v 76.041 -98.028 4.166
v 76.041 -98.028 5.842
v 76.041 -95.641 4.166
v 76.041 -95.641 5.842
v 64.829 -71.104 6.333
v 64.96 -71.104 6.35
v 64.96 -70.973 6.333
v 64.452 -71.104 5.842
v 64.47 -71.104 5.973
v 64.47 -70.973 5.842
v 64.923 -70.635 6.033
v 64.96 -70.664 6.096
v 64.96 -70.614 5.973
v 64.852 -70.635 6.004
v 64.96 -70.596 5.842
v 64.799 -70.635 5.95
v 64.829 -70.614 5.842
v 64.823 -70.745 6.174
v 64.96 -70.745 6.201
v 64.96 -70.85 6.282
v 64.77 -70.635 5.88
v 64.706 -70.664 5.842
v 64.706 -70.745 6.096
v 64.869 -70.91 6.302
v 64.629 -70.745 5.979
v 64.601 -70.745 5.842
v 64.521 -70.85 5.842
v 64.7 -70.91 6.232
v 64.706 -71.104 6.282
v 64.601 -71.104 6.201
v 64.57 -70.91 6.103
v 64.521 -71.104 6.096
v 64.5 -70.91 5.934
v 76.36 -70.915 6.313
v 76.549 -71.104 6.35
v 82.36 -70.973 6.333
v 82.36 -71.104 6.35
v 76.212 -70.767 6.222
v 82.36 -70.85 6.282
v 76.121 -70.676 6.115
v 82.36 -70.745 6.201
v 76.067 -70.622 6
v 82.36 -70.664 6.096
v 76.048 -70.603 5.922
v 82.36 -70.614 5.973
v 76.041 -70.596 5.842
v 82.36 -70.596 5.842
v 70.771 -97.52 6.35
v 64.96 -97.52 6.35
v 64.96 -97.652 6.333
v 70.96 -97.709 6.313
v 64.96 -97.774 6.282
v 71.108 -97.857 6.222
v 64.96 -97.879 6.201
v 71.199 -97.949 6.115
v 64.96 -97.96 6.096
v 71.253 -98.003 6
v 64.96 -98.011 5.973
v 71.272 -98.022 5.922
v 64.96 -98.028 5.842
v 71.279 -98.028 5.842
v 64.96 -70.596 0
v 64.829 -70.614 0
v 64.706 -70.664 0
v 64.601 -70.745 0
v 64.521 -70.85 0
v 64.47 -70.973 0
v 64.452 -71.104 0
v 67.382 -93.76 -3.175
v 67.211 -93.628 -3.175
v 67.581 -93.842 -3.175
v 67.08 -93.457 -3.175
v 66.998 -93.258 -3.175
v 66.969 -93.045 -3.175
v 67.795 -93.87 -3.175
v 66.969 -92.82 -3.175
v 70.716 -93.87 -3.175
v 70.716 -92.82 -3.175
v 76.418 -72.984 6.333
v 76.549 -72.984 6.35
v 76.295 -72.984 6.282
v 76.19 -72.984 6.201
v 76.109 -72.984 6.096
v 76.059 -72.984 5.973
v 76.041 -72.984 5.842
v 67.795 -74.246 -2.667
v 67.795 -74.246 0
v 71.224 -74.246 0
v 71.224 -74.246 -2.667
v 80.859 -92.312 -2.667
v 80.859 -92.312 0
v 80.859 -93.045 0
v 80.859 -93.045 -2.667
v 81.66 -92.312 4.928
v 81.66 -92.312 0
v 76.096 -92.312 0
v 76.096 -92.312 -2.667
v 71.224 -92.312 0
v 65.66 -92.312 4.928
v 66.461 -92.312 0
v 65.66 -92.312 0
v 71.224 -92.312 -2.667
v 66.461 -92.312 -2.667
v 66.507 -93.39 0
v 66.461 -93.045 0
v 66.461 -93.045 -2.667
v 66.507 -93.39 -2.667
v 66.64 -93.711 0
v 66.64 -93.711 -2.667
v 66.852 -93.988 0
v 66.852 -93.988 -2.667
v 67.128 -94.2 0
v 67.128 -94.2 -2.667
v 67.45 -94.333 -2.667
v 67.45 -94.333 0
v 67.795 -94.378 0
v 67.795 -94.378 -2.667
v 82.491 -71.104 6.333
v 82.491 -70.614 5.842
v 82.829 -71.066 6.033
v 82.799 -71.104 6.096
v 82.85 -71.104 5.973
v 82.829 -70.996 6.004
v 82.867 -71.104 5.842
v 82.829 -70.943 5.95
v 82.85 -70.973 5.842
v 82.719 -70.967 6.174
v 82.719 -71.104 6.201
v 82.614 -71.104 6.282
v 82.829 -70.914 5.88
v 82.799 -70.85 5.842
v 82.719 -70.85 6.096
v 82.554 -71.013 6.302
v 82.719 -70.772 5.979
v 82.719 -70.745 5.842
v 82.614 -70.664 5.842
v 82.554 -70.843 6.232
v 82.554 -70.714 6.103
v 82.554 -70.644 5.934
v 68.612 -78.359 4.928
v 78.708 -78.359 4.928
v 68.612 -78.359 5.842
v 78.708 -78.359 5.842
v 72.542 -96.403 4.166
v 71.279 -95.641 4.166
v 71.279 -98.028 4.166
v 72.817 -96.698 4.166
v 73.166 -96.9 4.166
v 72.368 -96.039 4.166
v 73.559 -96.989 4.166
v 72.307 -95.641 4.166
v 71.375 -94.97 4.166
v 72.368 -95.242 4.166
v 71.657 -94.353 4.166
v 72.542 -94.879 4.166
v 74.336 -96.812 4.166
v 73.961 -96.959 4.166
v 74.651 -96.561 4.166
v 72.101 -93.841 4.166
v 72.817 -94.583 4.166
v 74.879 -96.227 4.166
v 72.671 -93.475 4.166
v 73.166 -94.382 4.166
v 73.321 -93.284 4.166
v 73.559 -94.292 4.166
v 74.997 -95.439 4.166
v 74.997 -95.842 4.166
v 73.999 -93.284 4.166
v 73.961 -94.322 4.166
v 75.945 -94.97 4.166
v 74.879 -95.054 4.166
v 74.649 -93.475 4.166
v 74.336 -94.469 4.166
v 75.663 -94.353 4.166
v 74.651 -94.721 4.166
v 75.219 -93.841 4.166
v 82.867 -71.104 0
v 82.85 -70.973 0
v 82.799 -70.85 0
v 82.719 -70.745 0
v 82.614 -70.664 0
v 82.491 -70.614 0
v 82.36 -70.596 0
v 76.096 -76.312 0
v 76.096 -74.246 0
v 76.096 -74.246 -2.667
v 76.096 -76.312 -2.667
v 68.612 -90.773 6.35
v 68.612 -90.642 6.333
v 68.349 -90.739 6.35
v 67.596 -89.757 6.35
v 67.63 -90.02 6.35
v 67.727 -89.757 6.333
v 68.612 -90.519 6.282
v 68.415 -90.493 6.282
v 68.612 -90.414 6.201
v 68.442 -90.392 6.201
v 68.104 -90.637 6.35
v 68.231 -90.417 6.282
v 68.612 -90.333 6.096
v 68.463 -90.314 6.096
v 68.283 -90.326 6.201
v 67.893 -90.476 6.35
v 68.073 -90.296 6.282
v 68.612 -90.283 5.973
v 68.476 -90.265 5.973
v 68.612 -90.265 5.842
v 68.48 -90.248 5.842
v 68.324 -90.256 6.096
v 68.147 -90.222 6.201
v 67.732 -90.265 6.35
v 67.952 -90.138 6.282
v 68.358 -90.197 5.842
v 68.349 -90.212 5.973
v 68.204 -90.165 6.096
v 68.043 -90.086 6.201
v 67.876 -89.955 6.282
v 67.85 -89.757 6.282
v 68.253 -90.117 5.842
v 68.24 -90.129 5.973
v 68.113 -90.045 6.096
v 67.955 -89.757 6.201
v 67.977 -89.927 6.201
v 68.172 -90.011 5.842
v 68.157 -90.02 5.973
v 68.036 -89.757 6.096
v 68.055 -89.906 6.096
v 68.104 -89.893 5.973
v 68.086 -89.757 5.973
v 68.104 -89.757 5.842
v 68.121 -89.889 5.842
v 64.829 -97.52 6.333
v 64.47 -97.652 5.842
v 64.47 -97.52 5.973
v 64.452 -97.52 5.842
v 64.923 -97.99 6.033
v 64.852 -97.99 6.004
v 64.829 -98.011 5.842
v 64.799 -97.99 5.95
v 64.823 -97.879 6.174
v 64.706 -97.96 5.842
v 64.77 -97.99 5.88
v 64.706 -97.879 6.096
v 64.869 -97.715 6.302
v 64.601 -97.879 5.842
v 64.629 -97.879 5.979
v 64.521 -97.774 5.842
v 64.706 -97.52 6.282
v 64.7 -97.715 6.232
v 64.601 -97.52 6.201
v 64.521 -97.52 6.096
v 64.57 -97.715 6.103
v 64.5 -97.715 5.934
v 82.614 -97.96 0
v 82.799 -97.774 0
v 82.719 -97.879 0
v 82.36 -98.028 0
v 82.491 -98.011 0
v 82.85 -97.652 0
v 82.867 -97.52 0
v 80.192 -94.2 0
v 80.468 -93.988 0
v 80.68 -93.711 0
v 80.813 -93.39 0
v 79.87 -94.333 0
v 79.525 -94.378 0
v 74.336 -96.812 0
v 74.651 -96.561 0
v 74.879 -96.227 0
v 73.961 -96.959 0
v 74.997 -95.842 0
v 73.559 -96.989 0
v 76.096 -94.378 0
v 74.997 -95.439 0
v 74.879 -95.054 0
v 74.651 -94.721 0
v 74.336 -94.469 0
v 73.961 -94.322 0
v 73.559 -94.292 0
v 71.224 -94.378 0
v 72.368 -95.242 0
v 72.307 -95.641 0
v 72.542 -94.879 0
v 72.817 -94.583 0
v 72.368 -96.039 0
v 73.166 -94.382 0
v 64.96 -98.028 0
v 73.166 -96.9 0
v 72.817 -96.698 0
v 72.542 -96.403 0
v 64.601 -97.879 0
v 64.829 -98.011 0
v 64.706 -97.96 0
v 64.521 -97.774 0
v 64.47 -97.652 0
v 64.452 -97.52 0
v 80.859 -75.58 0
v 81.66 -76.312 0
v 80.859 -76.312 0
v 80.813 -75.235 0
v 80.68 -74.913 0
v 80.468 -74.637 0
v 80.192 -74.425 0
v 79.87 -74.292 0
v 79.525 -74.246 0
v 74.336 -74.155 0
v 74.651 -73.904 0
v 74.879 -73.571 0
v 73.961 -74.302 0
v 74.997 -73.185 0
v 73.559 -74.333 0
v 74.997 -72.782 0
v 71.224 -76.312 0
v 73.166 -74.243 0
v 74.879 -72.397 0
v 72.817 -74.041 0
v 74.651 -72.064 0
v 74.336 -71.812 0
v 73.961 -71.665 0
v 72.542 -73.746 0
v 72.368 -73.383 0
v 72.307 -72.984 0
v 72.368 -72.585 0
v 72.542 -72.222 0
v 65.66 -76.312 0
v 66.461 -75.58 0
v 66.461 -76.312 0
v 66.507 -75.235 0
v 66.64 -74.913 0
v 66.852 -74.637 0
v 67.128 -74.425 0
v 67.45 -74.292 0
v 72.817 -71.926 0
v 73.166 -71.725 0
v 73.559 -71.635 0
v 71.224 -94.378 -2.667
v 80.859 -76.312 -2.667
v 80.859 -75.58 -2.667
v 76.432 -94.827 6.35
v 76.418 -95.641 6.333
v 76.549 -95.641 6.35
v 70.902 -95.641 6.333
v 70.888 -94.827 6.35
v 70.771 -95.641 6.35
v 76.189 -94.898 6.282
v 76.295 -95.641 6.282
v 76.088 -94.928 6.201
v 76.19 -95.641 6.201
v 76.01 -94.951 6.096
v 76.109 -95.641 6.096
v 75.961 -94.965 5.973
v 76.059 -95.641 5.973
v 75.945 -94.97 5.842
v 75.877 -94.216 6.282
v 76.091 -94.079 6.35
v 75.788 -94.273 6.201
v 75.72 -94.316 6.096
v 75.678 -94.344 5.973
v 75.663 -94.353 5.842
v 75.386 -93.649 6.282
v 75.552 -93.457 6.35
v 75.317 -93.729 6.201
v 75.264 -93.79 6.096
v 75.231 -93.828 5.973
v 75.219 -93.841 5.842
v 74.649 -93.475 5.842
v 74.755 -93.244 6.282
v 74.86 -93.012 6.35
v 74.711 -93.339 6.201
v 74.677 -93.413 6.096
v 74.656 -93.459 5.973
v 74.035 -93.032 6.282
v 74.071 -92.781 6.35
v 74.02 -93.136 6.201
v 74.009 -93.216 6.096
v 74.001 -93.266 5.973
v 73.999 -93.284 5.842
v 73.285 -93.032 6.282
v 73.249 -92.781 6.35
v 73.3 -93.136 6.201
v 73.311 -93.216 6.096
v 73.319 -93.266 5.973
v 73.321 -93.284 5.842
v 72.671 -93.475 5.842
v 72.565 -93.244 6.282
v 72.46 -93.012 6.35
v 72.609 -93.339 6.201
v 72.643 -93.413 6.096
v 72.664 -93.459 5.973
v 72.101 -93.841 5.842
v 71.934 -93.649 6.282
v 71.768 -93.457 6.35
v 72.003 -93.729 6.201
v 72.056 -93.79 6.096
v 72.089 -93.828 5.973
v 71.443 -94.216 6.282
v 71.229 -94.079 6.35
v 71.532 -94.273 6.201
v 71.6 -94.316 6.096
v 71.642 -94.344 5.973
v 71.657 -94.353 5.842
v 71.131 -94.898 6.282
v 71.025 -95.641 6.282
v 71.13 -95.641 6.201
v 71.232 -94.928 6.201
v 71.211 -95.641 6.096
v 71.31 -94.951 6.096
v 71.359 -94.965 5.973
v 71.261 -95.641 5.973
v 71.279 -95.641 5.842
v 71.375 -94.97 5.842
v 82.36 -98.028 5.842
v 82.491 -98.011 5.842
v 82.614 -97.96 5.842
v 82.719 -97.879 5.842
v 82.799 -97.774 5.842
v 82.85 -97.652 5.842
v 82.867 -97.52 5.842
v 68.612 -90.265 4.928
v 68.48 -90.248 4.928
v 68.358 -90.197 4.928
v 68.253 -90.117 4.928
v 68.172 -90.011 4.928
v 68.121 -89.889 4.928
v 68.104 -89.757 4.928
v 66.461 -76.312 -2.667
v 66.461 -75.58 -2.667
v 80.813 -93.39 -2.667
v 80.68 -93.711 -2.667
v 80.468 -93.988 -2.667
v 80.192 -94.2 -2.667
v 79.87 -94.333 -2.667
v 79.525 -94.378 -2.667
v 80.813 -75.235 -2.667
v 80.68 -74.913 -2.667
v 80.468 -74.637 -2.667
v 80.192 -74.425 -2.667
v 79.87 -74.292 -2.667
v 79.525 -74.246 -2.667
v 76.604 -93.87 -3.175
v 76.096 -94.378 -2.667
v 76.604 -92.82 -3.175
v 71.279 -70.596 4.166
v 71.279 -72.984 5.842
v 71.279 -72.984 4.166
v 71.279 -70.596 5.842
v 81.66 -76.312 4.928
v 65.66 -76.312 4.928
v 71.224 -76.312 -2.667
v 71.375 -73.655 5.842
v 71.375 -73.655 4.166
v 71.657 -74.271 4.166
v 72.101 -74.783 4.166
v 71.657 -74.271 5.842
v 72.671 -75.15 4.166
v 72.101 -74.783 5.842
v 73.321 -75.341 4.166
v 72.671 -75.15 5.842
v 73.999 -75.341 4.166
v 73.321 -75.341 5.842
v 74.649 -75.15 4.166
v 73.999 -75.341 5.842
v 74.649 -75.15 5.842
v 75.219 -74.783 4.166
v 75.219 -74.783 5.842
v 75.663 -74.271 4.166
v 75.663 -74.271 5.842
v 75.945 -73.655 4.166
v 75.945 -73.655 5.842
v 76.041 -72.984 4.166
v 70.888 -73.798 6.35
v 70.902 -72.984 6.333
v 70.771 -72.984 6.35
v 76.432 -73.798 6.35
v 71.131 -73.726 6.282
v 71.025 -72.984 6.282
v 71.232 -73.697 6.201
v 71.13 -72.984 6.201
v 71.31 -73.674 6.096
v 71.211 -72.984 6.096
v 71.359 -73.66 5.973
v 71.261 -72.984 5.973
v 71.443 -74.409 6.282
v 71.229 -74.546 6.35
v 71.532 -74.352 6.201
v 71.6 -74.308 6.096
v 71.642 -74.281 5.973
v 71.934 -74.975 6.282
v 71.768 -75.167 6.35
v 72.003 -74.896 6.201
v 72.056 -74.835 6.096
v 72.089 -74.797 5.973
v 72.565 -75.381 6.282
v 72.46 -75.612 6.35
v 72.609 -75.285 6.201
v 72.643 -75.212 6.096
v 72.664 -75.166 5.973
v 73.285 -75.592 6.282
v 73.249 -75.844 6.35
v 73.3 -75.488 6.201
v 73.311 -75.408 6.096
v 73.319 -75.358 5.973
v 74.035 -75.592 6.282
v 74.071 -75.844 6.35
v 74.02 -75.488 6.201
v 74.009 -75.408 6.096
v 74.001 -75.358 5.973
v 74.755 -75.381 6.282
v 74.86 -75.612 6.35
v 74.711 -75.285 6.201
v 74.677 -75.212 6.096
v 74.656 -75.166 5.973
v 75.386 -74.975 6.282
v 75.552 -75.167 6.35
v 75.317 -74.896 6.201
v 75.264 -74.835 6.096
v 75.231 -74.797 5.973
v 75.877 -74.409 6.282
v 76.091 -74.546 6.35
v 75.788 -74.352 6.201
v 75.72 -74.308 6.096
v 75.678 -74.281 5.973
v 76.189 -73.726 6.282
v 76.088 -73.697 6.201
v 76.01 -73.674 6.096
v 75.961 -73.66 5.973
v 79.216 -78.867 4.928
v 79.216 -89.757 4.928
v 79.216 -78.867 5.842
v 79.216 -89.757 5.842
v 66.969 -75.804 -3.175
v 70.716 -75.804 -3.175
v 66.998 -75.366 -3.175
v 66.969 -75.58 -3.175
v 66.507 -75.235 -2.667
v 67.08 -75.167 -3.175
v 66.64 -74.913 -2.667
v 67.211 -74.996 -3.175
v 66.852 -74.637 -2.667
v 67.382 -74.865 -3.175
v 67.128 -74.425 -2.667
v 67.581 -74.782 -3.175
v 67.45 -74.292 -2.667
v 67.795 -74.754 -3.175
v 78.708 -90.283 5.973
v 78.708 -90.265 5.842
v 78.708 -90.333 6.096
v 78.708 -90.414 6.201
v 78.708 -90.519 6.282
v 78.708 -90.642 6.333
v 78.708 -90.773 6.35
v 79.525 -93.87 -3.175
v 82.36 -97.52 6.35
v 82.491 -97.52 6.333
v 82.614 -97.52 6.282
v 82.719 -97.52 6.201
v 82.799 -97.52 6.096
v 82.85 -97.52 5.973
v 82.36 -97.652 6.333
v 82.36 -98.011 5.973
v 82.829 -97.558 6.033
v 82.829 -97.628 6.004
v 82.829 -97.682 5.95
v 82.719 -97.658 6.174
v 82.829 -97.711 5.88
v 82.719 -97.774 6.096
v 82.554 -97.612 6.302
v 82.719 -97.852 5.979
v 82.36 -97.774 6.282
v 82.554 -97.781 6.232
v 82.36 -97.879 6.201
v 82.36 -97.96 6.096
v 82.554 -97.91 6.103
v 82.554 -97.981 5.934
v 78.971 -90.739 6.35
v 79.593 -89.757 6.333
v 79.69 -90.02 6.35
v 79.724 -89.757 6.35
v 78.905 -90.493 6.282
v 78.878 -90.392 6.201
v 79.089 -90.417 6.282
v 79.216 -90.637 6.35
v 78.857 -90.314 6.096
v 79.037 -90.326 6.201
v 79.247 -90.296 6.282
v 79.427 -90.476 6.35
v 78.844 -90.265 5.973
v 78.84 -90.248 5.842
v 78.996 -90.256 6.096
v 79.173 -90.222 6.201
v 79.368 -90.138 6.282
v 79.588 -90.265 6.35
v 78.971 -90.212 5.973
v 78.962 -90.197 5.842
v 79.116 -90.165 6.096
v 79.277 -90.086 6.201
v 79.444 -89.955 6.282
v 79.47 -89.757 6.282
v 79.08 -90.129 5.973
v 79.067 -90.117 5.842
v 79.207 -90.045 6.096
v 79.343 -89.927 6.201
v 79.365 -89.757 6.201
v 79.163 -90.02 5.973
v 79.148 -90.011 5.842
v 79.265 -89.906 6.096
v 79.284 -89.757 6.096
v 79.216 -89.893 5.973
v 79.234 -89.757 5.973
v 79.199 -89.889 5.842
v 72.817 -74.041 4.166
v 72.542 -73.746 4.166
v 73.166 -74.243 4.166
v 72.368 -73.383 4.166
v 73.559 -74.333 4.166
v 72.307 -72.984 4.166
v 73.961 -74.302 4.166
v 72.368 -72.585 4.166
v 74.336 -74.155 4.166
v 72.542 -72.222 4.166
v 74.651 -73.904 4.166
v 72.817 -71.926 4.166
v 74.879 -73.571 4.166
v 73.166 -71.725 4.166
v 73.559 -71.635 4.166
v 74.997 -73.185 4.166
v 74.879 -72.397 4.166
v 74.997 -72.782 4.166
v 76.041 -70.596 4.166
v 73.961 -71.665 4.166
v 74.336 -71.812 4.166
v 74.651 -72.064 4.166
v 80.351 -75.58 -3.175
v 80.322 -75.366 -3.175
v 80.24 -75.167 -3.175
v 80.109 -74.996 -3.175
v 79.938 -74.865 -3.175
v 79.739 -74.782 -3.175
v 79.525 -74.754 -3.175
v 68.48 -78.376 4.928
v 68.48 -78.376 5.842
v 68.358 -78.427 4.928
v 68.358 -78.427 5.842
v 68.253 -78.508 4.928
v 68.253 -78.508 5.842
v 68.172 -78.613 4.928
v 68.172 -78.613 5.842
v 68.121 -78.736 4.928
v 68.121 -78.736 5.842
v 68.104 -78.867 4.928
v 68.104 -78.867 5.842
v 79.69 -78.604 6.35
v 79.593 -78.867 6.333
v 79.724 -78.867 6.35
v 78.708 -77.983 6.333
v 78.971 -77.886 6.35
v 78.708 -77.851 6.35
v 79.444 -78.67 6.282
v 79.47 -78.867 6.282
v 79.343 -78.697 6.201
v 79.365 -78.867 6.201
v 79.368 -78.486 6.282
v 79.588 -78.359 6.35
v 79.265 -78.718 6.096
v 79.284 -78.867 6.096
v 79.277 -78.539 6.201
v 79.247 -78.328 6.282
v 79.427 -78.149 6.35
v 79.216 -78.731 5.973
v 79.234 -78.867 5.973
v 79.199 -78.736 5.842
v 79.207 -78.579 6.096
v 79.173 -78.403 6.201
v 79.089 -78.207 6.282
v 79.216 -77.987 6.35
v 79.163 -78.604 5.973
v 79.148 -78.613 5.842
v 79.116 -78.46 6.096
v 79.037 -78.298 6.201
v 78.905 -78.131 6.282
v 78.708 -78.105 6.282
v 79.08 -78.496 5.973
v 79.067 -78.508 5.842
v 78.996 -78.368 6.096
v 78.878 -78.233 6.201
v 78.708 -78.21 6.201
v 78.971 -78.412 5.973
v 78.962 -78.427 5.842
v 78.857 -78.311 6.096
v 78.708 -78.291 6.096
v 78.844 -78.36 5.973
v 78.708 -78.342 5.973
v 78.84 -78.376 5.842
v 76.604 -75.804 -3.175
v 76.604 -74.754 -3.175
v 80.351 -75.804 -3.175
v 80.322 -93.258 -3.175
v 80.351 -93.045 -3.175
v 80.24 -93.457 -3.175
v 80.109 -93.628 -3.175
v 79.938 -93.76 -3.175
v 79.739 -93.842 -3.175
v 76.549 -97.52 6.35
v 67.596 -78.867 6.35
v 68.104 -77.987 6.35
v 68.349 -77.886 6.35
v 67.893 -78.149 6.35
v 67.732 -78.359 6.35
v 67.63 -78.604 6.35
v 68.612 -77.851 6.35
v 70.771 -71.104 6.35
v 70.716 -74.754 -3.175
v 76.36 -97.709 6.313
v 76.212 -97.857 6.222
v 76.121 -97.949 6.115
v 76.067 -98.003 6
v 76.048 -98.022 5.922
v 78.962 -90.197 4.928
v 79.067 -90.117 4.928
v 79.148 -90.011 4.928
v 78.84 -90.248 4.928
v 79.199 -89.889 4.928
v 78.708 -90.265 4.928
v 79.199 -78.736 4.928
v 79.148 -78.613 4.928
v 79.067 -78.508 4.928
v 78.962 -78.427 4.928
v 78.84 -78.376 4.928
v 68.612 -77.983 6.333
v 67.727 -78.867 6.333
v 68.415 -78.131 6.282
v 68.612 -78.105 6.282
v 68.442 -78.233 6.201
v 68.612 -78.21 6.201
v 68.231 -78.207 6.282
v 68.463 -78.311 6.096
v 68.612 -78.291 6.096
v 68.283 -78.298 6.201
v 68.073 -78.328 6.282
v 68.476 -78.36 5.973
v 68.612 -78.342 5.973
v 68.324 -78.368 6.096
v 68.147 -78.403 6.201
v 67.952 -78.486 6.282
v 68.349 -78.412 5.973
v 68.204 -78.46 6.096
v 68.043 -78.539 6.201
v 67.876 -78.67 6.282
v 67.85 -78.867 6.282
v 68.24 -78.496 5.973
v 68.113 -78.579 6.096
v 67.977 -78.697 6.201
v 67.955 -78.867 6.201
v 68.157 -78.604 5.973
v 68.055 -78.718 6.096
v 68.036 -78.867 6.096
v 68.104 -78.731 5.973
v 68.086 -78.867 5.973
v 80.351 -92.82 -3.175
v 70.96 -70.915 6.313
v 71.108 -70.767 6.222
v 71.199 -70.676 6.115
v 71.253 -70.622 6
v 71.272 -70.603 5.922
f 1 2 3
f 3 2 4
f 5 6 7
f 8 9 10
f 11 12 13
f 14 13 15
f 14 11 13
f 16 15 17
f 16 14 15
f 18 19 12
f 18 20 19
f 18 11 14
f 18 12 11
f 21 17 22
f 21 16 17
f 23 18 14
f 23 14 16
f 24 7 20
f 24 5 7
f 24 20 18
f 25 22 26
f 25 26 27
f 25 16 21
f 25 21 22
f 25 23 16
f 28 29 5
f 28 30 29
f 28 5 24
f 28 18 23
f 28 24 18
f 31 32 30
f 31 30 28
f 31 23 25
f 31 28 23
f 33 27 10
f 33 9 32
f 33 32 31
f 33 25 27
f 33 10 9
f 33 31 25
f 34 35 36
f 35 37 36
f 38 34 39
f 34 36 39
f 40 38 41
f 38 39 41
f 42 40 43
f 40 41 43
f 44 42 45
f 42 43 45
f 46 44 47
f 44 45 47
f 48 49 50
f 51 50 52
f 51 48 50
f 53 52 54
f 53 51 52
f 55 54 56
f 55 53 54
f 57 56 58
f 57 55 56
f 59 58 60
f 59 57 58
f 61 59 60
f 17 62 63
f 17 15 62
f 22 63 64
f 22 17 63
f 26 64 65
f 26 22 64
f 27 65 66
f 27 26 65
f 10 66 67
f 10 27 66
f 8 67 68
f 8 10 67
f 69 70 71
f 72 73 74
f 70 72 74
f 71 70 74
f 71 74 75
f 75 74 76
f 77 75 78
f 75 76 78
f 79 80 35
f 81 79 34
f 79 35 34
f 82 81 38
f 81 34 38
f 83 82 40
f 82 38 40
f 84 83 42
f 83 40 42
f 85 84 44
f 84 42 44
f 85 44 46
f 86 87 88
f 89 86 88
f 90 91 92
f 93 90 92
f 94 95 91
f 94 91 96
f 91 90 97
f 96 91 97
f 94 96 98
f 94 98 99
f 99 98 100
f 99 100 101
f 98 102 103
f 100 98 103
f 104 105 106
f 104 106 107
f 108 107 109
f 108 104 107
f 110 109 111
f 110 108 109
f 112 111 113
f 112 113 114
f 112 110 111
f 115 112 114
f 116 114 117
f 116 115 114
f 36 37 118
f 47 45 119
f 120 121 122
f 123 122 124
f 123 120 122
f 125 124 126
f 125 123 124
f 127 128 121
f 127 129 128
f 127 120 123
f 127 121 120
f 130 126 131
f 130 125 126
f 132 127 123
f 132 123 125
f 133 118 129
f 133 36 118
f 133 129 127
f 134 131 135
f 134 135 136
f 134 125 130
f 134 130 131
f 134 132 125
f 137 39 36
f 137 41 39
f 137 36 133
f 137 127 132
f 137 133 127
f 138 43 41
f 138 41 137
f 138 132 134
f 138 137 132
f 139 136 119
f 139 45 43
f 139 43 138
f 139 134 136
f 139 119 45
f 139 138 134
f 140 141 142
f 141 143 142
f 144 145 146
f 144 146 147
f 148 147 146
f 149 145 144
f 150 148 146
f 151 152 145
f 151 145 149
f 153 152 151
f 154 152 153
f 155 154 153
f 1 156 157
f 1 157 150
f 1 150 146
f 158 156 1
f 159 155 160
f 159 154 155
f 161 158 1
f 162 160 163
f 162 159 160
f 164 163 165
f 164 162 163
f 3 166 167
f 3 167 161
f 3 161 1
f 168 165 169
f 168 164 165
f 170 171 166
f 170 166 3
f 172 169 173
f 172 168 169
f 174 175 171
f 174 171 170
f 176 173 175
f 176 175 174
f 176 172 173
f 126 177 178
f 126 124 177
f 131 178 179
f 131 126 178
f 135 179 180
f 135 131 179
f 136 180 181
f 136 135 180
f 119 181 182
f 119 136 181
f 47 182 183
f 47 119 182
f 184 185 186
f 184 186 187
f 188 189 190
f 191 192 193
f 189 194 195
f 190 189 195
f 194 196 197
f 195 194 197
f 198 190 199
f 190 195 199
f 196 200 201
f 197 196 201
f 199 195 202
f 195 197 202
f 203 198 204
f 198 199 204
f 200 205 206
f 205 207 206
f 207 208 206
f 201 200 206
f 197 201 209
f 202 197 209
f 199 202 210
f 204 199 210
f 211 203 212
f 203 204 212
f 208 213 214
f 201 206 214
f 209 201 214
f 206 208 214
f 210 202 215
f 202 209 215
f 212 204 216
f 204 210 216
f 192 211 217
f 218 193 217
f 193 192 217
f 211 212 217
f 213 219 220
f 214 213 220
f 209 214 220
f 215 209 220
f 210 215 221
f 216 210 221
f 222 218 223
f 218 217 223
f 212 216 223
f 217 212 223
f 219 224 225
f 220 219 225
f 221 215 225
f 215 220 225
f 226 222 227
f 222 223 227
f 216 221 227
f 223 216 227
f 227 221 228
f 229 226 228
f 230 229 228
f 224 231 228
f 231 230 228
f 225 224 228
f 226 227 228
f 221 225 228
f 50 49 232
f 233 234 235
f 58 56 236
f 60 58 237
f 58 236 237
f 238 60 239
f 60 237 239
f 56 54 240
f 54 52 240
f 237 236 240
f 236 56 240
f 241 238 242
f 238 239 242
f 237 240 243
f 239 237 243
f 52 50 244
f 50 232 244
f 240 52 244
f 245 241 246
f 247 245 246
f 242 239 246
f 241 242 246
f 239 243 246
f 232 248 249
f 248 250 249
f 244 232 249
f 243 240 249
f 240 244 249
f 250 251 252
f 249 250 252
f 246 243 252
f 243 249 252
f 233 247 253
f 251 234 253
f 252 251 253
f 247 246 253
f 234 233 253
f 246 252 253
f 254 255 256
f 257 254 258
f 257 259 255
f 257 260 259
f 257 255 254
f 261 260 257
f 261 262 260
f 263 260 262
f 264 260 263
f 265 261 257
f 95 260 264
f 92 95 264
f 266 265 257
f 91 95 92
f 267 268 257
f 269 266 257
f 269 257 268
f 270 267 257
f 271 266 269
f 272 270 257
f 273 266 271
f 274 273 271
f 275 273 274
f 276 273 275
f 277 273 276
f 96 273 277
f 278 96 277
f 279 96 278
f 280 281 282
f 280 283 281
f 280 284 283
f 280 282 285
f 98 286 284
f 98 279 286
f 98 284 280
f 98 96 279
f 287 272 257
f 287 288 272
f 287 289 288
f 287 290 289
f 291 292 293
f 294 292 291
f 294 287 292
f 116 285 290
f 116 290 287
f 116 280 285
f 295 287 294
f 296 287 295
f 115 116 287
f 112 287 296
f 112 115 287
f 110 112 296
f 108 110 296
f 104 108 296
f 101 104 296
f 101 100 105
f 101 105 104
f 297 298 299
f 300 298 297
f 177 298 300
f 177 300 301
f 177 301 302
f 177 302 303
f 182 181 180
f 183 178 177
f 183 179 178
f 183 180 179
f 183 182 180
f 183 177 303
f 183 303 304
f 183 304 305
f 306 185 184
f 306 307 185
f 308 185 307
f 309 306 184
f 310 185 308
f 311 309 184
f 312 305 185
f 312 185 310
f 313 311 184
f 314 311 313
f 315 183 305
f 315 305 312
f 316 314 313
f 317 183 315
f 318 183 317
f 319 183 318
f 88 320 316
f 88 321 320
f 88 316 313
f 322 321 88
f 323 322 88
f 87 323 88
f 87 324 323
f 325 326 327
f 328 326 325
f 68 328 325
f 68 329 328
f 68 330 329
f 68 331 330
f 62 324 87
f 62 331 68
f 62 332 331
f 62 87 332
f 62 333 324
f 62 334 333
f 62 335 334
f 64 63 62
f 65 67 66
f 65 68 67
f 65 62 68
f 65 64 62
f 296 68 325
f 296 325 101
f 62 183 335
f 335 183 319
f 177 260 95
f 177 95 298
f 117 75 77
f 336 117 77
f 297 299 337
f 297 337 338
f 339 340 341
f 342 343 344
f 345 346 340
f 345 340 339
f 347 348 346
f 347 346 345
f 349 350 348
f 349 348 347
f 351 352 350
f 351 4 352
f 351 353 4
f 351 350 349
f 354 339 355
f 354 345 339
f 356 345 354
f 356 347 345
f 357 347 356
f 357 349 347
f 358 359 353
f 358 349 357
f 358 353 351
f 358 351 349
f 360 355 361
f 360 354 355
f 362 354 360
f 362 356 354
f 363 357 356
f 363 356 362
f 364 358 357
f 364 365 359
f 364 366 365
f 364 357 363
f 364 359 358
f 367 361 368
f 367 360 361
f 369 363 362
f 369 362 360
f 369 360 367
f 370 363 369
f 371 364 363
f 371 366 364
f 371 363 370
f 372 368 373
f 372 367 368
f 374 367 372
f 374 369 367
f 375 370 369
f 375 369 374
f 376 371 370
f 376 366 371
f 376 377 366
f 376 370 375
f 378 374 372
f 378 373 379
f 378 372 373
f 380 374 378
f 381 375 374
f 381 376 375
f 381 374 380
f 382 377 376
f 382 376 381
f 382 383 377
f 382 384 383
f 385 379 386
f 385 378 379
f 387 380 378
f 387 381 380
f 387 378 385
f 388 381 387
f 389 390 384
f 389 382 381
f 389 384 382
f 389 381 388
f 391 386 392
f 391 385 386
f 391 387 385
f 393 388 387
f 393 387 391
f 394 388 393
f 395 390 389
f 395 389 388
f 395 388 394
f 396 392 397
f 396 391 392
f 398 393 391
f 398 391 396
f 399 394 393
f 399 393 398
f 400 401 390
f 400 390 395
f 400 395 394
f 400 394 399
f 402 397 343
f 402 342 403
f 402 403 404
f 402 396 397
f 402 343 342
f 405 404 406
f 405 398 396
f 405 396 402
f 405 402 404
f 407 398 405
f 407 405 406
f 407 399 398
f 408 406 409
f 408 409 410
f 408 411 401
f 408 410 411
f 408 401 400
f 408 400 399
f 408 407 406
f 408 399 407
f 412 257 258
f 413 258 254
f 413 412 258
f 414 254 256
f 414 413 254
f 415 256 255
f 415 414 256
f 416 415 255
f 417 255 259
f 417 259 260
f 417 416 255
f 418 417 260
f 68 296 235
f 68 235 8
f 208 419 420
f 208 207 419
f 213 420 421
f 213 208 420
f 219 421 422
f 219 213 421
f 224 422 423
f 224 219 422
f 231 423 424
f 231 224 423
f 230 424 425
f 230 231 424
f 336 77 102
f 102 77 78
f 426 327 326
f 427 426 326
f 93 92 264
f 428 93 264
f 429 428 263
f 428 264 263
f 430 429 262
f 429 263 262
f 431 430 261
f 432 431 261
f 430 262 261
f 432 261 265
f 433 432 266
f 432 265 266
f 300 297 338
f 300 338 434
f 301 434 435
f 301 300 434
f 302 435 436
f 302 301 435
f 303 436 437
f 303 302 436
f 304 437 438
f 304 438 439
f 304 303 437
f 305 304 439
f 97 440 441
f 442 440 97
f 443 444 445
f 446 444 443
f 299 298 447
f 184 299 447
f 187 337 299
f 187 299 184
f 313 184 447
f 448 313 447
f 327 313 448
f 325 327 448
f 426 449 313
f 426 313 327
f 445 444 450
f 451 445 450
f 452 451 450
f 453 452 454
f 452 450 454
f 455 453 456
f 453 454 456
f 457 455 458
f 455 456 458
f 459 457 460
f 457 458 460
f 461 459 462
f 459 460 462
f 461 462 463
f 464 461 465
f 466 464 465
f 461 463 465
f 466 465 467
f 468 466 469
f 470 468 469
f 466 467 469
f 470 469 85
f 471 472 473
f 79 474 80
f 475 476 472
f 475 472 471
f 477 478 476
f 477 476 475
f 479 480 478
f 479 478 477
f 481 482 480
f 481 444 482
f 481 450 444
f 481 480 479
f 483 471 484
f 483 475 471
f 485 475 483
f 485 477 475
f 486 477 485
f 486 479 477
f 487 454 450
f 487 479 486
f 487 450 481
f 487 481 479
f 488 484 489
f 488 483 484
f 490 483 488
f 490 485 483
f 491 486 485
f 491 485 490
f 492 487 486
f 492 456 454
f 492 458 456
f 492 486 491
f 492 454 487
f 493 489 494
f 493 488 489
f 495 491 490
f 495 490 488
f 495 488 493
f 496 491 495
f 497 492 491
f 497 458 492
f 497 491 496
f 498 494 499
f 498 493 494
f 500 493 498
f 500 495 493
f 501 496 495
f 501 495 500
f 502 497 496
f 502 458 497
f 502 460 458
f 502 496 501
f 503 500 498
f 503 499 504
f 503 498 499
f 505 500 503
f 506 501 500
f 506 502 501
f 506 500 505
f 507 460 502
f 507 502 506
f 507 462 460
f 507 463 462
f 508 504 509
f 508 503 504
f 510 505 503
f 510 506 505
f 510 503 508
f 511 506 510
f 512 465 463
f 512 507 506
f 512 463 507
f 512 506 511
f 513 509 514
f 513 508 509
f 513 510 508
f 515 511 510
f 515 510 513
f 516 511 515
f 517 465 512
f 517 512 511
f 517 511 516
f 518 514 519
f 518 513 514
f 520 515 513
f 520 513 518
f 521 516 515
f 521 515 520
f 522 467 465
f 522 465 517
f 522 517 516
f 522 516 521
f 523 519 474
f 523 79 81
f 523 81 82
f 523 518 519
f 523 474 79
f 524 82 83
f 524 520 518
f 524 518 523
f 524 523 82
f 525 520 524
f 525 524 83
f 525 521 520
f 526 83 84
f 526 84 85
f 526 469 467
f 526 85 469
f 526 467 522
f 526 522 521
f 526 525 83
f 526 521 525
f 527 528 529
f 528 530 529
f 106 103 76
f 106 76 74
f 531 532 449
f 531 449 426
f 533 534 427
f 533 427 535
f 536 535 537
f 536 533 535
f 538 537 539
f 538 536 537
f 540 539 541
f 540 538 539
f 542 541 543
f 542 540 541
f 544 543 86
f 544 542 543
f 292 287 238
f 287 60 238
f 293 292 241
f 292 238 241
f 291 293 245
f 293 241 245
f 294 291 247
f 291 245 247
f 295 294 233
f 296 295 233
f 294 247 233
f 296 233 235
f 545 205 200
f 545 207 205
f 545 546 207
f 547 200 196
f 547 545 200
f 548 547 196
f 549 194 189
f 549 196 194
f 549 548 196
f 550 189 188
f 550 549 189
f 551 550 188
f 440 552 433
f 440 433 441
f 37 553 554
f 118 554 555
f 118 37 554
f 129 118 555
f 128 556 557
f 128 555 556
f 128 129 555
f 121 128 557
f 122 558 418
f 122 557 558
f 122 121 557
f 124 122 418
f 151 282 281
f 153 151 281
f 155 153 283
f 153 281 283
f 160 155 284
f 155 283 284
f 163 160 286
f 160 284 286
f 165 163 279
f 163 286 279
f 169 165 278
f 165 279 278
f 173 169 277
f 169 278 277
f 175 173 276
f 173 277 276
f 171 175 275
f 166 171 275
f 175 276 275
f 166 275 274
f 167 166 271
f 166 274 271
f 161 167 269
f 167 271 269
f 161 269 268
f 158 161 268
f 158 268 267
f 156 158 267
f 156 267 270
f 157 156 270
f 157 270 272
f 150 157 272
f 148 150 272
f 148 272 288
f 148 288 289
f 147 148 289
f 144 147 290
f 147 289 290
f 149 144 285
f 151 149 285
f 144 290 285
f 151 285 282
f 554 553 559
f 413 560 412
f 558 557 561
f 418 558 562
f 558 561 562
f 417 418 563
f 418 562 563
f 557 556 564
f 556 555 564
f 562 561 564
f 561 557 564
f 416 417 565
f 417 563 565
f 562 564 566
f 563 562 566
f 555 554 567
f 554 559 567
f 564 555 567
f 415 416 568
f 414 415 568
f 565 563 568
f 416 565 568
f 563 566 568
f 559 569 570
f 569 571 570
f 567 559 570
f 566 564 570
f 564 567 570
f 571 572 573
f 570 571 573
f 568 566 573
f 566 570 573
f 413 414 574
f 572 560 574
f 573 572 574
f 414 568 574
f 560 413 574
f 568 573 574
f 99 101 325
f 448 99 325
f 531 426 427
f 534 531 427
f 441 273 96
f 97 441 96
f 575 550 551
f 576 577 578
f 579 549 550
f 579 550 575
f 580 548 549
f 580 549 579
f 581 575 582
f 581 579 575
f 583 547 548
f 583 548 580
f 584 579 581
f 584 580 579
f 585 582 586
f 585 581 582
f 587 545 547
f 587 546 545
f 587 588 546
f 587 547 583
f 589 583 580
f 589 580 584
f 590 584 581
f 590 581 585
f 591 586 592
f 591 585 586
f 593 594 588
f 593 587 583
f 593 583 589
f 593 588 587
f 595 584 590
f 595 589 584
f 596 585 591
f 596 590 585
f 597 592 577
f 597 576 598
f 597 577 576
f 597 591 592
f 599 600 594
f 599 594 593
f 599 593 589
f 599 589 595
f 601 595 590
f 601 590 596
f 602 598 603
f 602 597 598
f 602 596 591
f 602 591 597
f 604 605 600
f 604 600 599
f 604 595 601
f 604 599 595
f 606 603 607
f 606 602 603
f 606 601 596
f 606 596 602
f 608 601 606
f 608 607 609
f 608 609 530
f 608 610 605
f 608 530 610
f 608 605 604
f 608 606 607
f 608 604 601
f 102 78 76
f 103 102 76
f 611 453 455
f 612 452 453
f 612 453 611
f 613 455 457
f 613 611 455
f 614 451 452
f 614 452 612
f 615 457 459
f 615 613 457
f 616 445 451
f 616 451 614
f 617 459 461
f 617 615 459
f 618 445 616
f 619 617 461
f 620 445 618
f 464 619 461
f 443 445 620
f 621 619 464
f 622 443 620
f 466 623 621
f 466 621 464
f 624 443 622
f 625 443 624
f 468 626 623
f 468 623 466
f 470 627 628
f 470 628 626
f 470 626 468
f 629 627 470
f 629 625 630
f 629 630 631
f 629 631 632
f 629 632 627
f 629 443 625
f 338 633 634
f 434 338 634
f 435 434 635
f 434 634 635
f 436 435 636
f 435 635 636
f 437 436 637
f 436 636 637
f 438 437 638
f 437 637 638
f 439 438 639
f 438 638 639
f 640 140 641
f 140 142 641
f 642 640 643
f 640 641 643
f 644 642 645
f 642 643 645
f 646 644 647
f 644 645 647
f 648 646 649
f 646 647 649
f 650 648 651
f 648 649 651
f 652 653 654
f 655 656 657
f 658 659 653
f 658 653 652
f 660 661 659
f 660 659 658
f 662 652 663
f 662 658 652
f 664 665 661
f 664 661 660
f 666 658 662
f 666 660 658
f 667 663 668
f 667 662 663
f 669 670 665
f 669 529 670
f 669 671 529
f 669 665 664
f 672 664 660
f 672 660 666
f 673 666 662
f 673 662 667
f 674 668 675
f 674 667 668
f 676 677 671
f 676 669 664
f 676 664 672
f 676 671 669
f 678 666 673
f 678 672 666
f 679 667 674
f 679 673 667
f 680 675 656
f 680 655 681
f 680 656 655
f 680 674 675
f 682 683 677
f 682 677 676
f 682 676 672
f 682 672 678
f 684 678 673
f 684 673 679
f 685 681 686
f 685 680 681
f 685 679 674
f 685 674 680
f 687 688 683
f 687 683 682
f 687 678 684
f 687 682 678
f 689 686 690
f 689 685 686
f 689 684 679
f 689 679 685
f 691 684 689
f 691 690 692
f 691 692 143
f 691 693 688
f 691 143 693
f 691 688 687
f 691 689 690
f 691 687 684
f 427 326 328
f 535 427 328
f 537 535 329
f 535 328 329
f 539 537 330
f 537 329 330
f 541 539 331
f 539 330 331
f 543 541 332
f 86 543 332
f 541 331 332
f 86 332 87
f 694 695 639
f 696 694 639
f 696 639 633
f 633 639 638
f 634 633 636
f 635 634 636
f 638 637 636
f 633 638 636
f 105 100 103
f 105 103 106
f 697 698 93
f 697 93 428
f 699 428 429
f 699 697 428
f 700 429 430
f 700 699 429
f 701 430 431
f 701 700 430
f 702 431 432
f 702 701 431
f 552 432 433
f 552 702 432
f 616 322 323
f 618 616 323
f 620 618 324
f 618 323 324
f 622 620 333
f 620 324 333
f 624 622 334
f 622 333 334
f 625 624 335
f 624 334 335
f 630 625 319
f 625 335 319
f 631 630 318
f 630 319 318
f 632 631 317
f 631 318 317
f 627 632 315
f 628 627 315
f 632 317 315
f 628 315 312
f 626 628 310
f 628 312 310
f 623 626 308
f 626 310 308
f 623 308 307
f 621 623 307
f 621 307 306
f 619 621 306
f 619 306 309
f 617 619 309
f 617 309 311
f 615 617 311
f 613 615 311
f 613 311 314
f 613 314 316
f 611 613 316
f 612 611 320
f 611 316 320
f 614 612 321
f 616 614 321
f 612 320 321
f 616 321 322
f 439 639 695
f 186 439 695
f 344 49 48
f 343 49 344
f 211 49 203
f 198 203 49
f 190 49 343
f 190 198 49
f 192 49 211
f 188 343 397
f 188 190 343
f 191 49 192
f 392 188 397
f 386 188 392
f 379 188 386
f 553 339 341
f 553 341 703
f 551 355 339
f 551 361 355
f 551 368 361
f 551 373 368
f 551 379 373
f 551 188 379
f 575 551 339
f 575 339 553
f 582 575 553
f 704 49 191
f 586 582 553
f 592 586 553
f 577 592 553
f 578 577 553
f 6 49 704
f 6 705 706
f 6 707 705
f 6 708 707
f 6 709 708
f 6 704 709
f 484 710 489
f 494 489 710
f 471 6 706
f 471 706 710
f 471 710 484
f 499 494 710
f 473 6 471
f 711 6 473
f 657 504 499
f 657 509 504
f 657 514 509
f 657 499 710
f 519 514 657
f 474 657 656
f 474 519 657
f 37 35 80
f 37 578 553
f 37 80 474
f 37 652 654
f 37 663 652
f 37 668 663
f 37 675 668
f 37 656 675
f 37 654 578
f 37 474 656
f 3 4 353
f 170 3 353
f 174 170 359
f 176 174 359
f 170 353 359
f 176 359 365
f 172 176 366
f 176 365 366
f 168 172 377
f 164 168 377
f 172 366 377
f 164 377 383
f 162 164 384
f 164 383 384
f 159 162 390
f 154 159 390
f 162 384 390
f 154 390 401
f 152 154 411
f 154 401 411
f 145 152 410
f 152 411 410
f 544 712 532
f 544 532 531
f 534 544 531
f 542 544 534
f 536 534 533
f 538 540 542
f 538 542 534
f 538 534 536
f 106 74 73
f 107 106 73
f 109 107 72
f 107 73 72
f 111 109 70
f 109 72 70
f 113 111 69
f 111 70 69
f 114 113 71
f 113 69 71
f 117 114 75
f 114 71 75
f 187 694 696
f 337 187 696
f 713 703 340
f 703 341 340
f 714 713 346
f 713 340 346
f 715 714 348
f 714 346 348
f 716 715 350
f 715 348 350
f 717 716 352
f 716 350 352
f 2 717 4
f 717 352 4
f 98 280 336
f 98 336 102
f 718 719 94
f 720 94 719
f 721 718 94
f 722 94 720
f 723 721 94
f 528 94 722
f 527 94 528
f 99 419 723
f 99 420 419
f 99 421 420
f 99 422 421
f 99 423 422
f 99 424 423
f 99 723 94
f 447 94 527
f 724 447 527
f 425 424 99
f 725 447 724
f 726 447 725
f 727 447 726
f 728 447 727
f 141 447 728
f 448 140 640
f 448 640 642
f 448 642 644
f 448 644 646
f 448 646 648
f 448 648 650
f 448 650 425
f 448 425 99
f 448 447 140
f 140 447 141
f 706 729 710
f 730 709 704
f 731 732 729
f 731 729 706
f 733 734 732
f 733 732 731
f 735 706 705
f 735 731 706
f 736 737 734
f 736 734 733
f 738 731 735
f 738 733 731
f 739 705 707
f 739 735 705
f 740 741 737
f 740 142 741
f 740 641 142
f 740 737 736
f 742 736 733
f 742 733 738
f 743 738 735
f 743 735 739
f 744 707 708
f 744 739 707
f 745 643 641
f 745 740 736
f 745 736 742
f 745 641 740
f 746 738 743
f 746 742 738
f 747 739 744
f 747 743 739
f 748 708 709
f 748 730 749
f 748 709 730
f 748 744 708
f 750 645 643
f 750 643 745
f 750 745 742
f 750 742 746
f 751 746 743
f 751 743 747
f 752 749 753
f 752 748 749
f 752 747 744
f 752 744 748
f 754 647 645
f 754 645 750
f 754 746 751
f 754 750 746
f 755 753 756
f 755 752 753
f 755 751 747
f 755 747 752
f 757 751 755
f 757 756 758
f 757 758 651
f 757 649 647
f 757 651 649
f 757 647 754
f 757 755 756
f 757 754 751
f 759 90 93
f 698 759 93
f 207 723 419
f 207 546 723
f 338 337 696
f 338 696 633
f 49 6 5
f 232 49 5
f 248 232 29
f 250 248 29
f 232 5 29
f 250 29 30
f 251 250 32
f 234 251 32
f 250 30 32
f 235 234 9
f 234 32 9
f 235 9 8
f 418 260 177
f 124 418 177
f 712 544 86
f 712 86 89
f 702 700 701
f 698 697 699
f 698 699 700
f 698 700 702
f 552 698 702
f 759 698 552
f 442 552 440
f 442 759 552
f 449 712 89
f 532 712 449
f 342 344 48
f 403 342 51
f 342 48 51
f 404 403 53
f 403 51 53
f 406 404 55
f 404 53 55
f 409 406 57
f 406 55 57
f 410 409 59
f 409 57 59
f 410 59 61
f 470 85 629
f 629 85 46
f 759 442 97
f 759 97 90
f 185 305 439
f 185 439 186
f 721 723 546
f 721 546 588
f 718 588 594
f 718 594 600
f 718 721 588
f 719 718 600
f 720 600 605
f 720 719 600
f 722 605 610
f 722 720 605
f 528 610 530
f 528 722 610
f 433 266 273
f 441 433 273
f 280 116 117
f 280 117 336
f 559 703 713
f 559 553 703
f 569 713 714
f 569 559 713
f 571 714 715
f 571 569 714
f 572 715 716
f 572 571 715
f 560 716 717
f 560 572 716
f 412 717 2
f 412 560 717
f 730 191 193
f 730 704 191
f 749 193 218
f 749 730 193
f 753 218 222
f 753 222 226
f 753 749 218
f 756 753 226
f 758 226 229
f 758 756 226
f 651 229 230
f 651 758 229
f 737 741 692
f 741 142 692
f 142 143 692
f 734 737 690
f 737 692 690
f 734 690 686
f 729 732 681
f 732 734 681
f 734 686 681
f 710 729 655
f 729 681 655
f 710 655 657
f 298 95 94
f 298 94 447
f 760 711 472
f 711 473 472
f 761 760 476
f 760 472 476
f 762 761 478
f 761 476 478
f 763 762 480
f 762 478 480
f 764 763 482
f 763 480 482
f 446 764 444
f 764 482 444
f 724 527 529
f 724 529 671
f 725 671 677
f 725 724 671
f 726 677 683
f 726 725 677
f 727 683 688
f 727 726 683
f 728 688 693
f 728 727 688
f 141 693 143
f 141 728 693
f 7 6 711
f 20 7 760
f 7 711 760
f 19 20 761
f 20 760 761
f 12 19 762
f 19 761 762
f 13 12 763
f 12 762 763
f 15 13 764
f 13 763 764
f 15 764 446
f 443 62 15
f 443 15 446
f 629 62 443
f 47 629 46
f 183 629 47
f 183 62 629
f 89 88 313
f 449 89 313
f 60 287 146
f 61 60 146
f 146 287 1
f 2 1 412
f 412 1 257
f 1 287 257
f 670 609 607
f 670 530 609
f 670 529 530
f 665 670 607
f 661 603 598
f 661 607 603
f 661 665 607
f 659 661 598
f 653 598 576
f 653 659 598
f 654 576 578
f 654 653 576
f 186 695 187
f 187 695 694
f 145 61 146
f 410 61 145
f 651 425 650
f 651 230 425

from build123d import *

# Parameters (mm, degrees)
SKETCH1_W                                      = 18.415
SKETCH1_H                                      = 27.432
BOSS_EXTRUDE1_DEPTH                            = 6.35
SKETCH2_W                                      = 11.1125
SKETCH2_H                                      = 11.90625
CUT_EXTRUDE1_DEPTH                             = 7.35
SHELL1_T                                       = -1
BOSS_EXTRUDE2_REACH                            = 8.35
SKETCH5_W                                      = 5.7752
SKETCH5_H                                      = 5.7752
CBORE_FOR_2_SOCKET_HEAD_CAP_SCREW2_D           = 2.7051
CBORE_FOR_2_SOCKET_HEAD_CAP_SCREW2_CBORE_D     = 4.7625
CBORE_FOR_2_SOCKET_HEAD_CAP_SCREW2_CBORE_DEPTH = 2.1844
CUT_EXTRUDE2_DEPTH                             = 4.9276
SKETCH7_W                                      = 11.1125
SKETCH7_H                                      = 11.90625
BOSS_EXTRUDE4_DEPTH                            = 0.4224
SKETCH8_W                                      = 4.7625
SKETCH8_H                                      = 2.3876
CUT_EXTRUDE3_DEPTH                             = 2.1844
FILLET1_R                                      = 0.508
BOSS_EXTRUDE5_REACH                            = 8.35
SKETCH10_W                                     = 16
SKETCH10_H                                     = 16
BOSS_EXTRUDE6_DEPTH                            = 3.175
CHAMFER1_SIZE                                  = 0.508


with BuildPart() as part:
    # Sketch1 → Boss-Extrude1 (new body)
    with BuildSketch(Plane.XY):
        with Locations((73.66, -84.3122297)):
            Rectangle(SKETCH1_W, SKETCH1_H)
    extrude(amount=BOSS_EXTRUDE1_DEPTH)

    # Sketch2 → Cut-Extrude1 (cut, through all)
    with BuildSketch(Plane.XY.offset(6.35)):
        with Locations((73.66, -84.3122297)):
            Rectangle(SKETCH2_W, SKETCH2_H)
    extrude(amount=-CUT_EXTRUDE1_DEPTH, mode=Mode.SUBTRACT)

    # Shell1
    shell1_openings = [part.faces().sort_by_distance(p)[0] for p in [
        (73.66, -90.2653547, 3.175),
        (68.10375, -84.3122297, 3.175),
        (73.66, -78.3591047, 3.175),
        (79.21625, -84.3122297, 3.175),
        (73.66, -84.3122297, 0),
    ]]
    offset(amount=SHELL1_T, openings=shell1_openings, kind=Kind.INTERSECTION)

    # Sketch5 → Boss-Extrude2 (add, up to next)
    with BuildSketch(Plane(origin=(0, 0, 0), x_dir=(-1, 0, 0), z_dir=(0, 0, -1)), mode=Mode.PRIVATE) as boss_extrude2_sk1:
        with Locations((-73.66, -73.4838297)):
            Rectangle(SKETCH5_W, SKETCH5_H)
    boss_extrude2_tool1 = extrude(boss_extrude2_sk1.sketch, amount=-BOSS_EXTRUDE2_REACH, mode=Mode.PRIVATE) - part.part
    add(boss_extrude2_tool1.solids().sort_by_distance((73.66, -73.48383, 0))[0])
    # Sketch5 → Boss-Extrude2 (add, up to next)
    with BuildSketch(Plane(origin=(0, 0, 0), x_dir=(-1, 0, 0), z_dir=(0, 0, -1)), mode=Mode.PRIVATE) as boss_extrude2_sk2:
        with Locations((-73.66, -95.1406297)):
            Rectangle(SKETCH5_W, SKETCH5_H)
    boss_extrude2_tool2 = extrude(boss_extrude2_sk2.sketch, amount=-BOSS_EXTRUDE2_REACH, mode=Mode.PRIVATE) - part.part
    add(boss_extrude2_tool2.solids().sort_by_distance((73.66, -95.14063, 0))[0])

    # CBORE for #2 Socket Head Cap Screw2 (through all)
    with Locations(Plane.XY.offset(6.35)):
        with Locations((73.66, -95.6406297), (73.66, -72.9838297)):
            CounterBoreHole(CBORE_FOR_2_SOCKET_HEAD_CAP_SCREW2_D / 2, CBORE_FOR_2_SOCKET_HEAD_CAP_SCREW2_CBORE_D / 2, CBORE_FOR_2_SOCKET_HEAD_CAP_SCREW2_CBORE_DEPTH)

    # Sketch6 → Cut-Extrude2 (cut)
    with BuildSketch(Plane(origin=(0, 0, 0), x_dir=(-1, 0, 0), z_dir=(0, 0, -1))):
        with BuildLine():
            Line((-76.5476, -95.6406297), (-76.8016, -95.6406297))
            Line((-76.8016, -95.6406297), (-76.8016, -92.2530297))
            Line((-76.8016, -92.2530297), (-70.5184, -92.2530297))
            Line((-70.5184, -92.2530297), (-70.5184, -95.6406297))
            Line((-70.5184, -95.6406297), (-70.7724, -95.6406297))
            ThreePointArc((-70.7724, -95.6406297), (-73.66, -92.7530297), (-76.5476, -95.6406297))
        make_face()
        with BuildLine():
            Line((-76.8016, -72.9838297), (-76.8016, -76.3714297))
            Line((-76.8016, -76.3714297), (-70.5184, -76.3714297))
            Line((-70.5184, -76.3714297), (-70.5184, -72.9838297))
            Line((-70.5184, -72.9838297), (-70.7724, -72.9838297))
            ThreePointArc((-70.7724, -72.9838297), (-73.66, -75.8714297), (-76.5476, -72.9838297))
            Line((-76.5476, -72.9838297), (-76.8016, -72.9838297))
        make_face()
    extrude(amount=-CUT_EXTRUDE2_DEPTH, mode=Mode.SUBTRACT)

    # Sketch7 → Boss-Extrude4 (add)
    with BuildSketch(Plane(origin=(0, 0, 5.35), x_dir=(-1, 0, 0), z_dir=(0, 0, -1))):
        Polygon((-70.7724, -76.3714297), (-76.5476, -76.3714297), (-76.5476, -71.5962297), (-81.8675, -71.5962297), (-81.8675, -97.0282297), (-76.5476, -97.0282297), (-76.5476, -92.2530297), (-70.7724, -92.2530297), (-70.7724, -97.0282297), (-65.4525, -97.0282297), (-65.4525, -71.5962297), (-70.7724, -71.5962297), align=None)
        with Locations((-73.66, -84.3122297)):
            Rectangle(SKETCH7_W, SKETCH7_H, mode=Mode.SUBTRACT)
    extrude(amount=BOSS_EXTRUDE4_DEPTH)

    # Sketch8 → Cut-Extrude3 (cut)
    with BuildSketch(Plane.XY.offset(6.35)):
        with Locations((73.66, -96.8344297)):
            Rectangle(SKETCH8_W, SKETCH8_H)
        with Locations((73.66, -71.7900297)):
            Rectangle(SKETCH8_W, SKETCH8_H)
    extrude(amount=-CUT_EXTRUDE3_DEPTH, mode=Mode.SUBTRACT)

    # Fillet1
    fillet1_edges = [part.edges().sort_by_distance(p)[0] for p in [
        (79.454375, -70.5962297, 6.35),
        (73.66, -93.2593797, 6.35),
        (64.4525, -84.3122297, 6.35),
        (79.21625, -90.2653547, 5.6388),
        (68.10375, -90.2653547, 5.6388),
        (68.10375, -78.3591047, 5.6388),
        (79.21625, -78.3591047, 5.6388),
        (73.66, -90.2653547, 6.35),
        (79.21625, -84.3122297, 6.35),
        (73.66, -78.3591047, 6.35),
        (68.10375, -84.3122297, 6.35),
        (79.454375, -98.0282297, 6.35),
        (76.04125, -96.8344297, 6.35),
        (71.27875, -96.8344297, 6.35),
        (73.66, -75.3650797, 6.35),
        (67.865625, -70.5962297, 6.35),
        (71.27875, -71.7900297, 6.35),
        (76.04125, -71.7900297, 6.35),
        (67.865625, -98.0282297, 6.35),
        (82.8675, -84.3122297, 6.35),
        (64.4525, -98.0282297, 3.175),
        (64.4525, -70.5962297, 3.175),
        (82.8675, -70.5962297, 3.175),
        (82.8675, -98.0282297, 3.175),
    ]]
    fillet(fillet1_edges, radius=FILLET1_R)

    # Sketch10 → Boss-Extrude5 (add, up to next)
    with BuildSketch(Plane(origin=(0, 0, 0), x_dir=(-1, 0, 0), z_dir=(0, 0, -1)), mode=Mode.PRIVATE) as boss_extrude5_sk1:
        with BuildLine():
            Line((-76.5476, -97.0282297), (-76.5476, -95.6406297))
            ThreePointArc((-76.5476, -95.6406297), (-73.66, -92.7530297), (-70.7724, -95.6406297))
            Line((-70.7724, -95.6406297), (-70.7724, -97.0282297))
            Line((-70.7724, -97.0282297), (-65.4525, -97.0282297))
            Line((-65.4525, -97.0282297), (-65.4525, -71.5962297))
            Line((-65.4525, -71.5962297), (-70.7724, -71.5962297))
            Line((-70.7724, -71.5962297), (-70.7724, -72.9838297))
            ThreePointArc((-70.7724, -72.9838297), (-73.66, -75.8714297), (-76.5476, -72.9838297))
            Line((-76.5476, -72.9838297), (-76.5476, -71.5962297))
            Line((-76.5476, -71.5962297), (-81.8675, -71.5962297))
            Line((-81.8675, -71.5962297), (-81.8675, -97.0282297))
            Line((-81.8675, -97.0282297), (-76.5476, -97.0282297))
        make_face()
        with Locations((-73.66, -84.3122297)):
            Rectangle(SKETCH10_W, SKETCH10_H, mode=Mode.SUBTRACT)
    boss_extrude5_tool1 = extrude(boss_extrude5_sk1.sketch, amount=-BOSS_EXTRUDE5_REACH, mode=Mode.PRIVATE) - part.part
    add(boss_extrude5_tool1.solids().sort_by_distance((76.850294, -72.29003, 0))[0])

    # Sketch11 → Boss-Extrude6 (add)
    with BuildSketch(Plane(origin=(0, 0, 0), x_dir=(-1, 0, 0), z_dir=(0, 0, -1))):
        with BuildLine():
            Line((-66.461462743, -92.3122297), (-66.461462743, -93.0447297))
            ThreePointArc((-66.461462743, -93.0447297), (-66.85203585, -93.987656593), (-67.794962743, -94.3782297))
            Line((-67.794962743, -94.3782297), (-71.223962743, -94.3782297))
            Line((-71.223962743, -94.3782297), (-71.223962743, -92.3122297))
            Line((-71.223962743, -92.3122297), (-66.461462743, -92.3122297))
        make_face()
        with BuildLine():
            Line((-76.096037257, -92.3122297), (-80.858537257, -92.3122297))
            Line((-80.858537257, -92.3122297), (-80.858537257, -93.0447297))
            ThreePointArc((-80.858537257, -93.0447297), (-80.46796415, -93.987656593), (-79.525037257, -94.3782297))
            Line((-79.525037257, -94.3782297), (-76.096037257, -94.3782297))
            Line((-76.096037257, -94.3782297), (-76.096037257, -92.3122297))
        make_face()
        with BuildLine():
            Line((-80.858537257, -76.3122297), (-80.858537257, -75.5797297))
            ThreePointArc((-80.858537257, -75.5797297), (-80.46796415, -74.636802807), (-79.525037257, -74.2462297))
            Line((-79.525037257, -74.2462297), (-76.096037257, -74.2462297))
            Line((-76.096037257, -74.2462297), (-76.096037257, -76.3122297))
            Line((-76.096037257, -76.3122297), (-80.858537257, -76.3122297))
        make_face()
        with BuildLine():
            Line((-71.223962743, -76.3122297), (-66.461462743, -76.3122297))
            Line((-66.461462743, -76.3122297), (-66.461462743, -75.5797297))
            ThreePointArc((-66.461462743, -75.5797297), (-66.85203585, -74.636802807), (-67.794962743, -74.2462297))
            Line((-67.794962743, -74.2462297), (-71.223962743, -74.2462297))
            Line((-71.223962743, -74.2462297), (-71.223962743, -76.3122297))
        make_face()
    extrude(amount=BOSS_EXTRUDE6_DEPTH)

    # Chamfer1
    chamfer1_edges = [part.edges().sort_by_distance(p)[0] for p in [
        (68.842712743, -92.3122297, -3.175),
        (71.223962743, -93.3452297, -3.175),
        (69.509462743, -94.3782297, -3.175),
        (66.85203585, -93.987656593, -3.175),
        (66.461462743, -92.6784797, -3.175),
        (80.858537257, -92.6784797, -3.175),
        (80.46796415, -93.987656593, -3.175),
        (77.810537257, -94.3782297, -3.175),
        (76.096037257, -93.3452297, -3.175),
        (78.477287257, -92.3122297, -3.175),
        (80.46796415, -74.636802807, -3.175),
        (80.858537257, -75.9459797, -3.175),
        (78.477287257, -76.3122297, -3.175),
        (76.096037257, -75.2792297, -3.175),
        (77.810537257, -74.2462297, -3.175),
        (66.461462743, -75.9459797, -3.175),
        (66.85203585, -74.636802807, -3.175),
        (69.509462743, -74.2462297, -3.175),
        (71.223962743, -75.2792297, -3.175),
        (68.842712743, -76.3122297, -3.175),
    ]]
    chamfer(chamfer1_edges, length=CHAMFER1_SIZE)


solid = part.part
